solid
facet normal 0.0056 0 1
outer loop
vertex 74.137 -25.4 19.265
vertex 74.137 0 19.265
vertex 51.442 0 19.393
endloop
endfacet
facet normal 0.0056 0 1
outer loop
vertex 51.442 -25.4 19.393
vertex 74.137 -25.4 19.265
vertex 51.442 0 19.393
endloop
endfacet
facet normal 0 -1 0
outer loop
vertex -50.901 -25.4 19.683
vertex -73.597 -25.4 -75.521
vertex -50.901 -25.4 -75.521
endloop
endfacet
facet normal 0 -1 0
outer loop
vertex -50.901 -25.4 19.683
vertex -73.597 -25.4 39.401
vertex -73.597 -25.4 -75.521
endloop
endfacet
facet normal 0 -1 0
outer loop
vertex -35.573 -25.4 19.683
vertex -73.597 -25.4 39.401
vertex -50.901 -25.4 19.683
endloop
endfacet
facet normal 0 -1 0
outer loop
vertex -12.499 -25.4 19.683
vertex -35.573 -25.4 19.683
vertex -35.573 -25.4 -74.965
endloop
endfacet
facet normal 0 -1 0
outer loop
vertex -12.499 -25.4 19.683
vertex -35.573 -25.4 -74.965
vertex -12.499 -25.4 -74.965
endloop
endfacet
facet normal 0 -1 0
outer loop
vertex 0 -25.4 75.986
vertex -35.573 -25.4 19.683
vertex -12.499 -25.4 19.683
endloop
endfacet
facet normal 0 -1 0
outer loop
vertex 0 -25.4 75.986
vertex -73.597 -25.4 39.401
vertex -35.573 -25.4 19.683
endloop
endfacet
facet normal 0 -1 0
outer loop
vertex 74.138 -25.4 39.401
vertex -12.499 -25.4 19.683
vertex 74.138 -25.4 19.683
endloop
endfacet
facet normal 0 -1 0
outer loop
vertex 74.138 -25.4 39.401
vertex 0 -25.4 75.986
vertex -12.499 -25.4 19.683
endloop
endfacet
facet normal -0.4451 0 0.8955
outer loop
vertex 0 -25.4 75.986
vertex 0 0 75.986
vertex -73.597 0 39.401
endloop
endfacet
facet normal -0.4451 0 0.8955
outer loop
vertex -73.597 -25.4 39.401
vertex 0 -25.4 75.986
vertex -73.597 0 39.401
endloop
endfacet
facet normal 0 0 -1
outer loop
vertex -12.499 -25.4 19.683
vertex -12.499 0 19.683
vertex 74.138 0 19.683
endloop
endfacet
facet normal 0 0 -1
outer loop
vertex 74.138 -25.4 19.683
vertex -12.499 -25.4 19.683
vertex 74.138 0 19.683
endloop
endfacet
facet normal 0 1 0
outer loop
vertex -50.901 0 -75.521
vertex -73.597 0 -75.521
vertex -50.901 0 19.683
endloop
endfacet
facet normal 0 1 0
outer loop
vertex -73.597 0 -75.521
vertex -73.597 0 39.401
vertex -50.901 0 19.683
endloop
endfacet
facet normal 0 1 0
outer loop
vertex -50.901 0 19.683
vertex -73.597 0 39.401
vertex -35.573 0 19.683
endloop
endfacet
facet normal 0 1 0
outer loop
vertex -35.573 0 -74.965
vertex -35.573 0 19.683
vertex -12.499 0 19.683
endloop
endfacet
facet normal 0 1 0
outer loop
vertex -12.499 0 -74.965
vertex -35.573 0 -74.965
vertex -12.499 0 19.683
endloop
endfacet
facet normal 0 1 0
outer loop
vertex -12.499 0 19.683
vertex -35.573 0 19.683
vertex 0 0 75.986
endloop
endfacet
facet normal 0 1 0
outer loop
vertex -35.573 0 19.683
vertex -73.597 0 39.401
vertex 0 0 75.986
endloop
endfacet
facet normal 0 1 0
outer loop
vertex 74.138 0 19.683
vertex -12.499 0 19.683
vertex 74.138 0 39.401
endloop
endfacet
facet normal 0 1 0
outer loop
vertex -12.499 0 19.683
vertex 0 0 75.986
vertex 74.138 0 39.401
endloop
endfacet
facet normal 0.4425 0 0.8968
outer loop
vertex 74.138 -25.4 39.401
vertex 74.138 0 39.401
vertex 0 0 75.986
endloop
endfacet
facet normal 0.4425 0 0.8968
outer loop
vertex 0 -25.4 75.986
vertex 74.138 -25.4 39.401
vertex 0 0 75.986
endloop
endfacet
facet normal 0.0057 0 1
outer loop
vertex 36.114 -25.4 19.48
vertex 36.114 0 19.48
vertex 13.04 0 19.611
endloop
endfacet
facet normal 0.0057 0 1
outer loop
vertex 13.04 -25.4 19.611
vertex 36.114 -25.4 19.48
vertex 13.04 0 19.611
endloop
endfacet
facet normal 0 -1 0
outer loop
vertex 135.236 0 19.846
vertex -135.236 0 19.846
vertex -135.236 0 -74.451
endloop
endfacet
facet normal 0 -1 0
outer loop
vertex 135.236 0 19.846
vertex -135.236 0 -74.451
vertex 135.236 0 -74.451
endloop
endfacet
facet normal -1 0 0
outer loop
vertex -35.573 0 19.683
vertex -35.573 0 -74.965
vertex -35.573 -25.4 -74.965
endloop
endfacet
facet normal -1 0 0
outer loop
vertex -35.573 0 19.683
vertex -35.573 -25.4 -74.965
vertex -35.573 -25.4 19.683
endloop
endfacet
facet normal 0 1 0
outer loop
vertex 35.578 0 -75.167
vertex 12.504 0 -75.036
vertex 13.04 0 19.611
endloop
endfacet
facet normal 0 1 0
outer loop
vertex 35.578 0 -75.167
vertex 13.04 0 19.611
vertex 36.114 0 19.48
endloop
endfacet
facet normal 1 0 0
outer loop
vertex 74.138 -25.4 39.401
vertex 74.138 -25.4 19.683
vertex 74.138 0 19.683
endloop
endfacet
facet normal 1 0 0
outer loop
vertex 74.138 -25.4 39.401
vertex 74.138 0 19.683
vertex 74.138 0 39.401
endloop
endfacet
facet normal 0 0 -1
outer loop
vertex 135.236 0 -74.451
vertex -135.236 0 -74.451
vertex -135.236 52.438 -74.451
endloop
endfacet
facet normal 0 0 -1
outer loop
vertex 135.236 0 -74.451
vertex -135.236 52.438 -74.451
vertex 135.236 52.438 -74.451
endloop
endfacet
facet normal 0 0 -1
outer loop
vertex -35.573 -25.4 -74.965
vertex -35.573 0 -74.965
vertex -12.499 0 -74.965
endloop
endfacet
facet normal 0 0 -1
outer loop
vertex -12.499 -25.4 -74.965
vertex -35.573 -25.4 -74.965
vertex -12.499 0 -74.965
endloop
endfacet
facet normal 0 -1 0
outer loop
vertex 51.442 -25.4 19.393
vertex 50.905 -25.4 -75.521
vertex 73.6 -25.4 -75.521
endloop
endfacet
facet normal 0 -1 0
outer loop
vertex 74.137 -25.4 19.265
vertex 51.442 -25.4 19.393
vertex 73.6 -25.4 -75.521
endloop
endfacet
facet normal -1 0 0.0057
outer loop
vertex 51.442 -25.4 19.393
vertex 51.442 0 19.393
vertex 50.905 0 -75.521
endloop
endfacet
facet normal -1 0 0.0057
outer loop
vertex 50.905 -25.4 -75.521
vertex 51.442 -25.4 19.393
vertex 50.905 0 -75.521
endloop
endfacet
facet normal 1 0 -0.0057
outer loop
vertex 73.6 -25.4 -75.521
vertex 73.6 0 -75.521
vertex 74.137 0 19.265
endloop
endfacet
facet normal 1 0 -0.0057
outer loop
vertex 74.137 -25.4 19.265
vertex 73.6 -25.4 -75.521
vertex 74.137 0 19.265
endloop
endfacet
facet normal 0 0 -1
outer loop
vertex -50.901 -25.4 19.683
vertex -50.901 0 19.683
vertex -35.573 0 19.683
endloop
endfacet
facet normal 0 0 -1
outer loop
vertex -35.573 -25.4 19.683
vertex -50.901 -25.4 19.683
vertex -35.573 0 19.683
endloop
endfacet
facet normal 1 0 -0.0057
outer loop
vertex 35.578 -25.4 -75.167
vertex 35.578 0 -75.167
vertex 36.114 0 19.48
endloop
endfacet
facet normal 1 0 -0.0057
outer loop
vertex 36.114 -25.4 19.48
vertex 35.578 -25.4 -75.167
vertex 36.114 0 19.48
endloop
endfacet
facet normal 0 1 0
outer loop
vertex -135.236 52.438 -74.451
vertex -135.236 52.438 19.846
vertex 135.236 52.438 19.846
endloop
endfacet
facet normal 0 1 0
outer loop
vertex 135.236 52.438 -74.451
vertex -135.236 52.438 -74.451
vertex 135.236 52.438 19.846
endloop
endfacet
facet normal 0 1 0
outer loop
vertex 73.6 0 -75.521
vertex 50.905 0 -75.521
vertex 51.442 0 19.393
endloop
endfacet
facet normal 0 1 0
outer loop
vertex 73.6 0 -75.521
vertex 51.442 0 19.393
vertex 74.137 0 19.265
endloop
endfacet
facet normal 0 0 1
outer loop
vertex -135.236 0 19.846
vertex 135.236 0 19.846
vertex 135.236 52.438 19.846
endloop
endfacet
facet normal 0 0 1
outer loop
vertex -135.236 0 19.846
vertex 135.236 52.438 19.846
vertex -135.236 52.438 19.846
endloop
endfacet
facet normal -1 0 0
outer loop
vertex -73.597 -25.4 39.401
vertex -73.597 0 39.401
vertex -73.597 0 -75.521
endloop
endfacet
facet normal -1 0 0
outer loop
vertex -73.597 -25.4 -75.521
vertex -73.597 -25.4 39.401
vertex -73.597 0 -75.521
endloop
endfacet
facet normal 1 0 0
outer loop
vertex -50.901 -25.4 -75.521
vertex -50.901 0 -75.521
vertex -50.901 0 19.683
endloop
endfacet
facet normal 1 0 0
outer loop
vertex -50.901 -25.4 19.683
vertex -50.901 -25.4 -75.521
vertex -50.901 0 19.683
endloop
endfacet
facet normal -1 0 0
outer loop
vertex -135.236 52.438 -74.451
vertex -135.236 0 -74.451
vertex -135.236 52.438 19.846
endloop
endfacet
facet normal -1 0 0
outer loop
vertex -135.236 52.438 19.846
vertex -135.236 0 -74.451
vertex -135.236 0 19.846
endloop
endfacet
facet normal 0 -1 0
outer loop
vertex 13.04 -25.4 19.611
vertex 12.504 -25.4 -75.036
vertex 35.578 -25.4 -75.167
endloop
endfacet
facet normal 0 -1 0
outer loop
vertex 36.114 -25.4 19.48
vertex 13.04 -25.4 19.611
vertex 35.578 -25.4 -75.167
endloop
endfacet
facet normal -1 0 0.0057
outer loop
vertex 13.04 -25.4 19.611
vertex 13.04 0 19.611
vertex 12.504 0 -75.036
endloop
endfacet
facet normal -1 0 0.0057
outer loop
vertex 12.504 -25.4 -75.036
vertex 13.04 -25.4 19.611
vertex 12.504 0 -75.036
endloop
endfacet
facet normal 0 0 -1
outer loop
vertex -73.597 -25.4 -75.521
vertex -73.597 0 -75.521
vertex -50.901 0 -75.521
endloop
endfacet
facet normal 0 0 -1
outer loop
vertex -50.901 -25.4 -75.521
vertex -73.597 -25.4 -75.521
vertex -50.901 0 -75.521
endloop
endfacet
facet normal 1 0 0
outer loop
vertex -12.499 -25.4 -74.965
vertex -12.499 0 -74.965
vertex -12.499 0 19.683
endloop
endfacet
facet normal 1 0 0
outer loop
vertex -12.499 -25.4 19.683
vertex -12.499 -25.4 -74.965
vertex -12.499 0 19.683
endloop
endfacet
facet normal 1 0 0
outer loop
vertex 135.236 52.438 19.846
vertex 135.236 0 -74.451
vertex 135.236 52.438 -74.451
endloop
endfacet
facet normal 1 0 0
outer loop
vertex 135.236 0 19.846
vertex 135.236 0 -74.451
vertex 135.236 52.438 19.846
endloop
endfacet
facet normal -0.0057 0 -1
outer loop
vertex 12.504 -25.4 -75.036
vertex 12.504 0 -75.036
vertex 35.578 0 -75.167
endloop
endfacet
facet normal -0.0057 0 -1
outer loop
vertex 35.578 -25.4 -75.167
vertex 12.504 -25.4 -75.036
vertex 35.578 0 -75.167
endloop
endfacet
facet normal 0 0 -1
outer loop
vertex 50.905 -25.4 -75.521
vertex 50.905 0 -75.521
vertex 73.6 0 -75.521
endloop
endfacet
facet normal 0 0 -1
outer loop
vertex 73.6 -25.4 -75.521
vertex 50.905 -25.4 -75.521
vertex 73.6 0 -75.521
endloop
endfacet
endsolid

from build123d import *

# Parameters (mm, degrees)
F0_W     = 22.6951092482
F0_H     = 95.2044054866
F0_W_2   = 23.0742692947
F0_H_2   = 94.6485325694
F1_DEPTH = 25.4
F2_W     = 135.2362185717
F2_H     = 94.296477735
F3_DEPTH = 52.4381194264


with BuildPart() as f1:
    # F0 (on Front) → F1 (new body)
    with BuildSketch(Plane.XZ):
        with Locations((-62.2489973903, -27.9190726578)):
            Rectangle(F0_W, F0_H)
        with Locations((-24.0356624126, -27.6411361992)):
            Rectangle(F0_W_2, F0_H_2)
        Polygon((-73.5965520144, 39.4006446004), (-73.5965520144, 19.6831300855), (-50.9014427662, 19.6831300855), (-35.57279706, 19.6831300855), (-12.4985277653, 19.6831300855), (0.2708360553, 19.6831300855), (74.1382241249, 19.6831300855), (74.1382241249, 39.4006446004), align=None)
        Polygon((0, 75.9860053658), (-73.5965520144, 39.4006446004), (74.1382241249, 39.4006446004), align=None)
    extrude(amount=F1_DEPTH)


with BuildPart() as f1b:
    # F0 (on Front) → F1, piece 2 (new body)
    with BuildSketch(Plane.XZ):
        Polygon((36.113894749, 19.4802055093), (13.039995237, 19.6108378116), (12.5041535355, -75.0361779428), (35.5780530475, -75.1668102451), align=None)
    extrude(amount=F1_DEPTH)


with BuildPart() as f1c:
    # F0 (on Front) → F1, piece 3 (new body)
    with BuildSketch(Plane.XZ):
        Polygon((51.4422948019, 19.3934241575), (50.9049376152, -75.5212754011), (73.6004105757, -75.5212754011), (74.1370403436, 19.2649384259), align=None)
    extrude(amount=F1_DEPTH)


with BuildPart() as f3:
    # F2 (on Front) → F3 (new body)
    with BuildSketch(Plane.XZ):
        with Locations((67.6181092858, -27.3026116192)):
            Rectangle(F2_W, F2_H)
        with Locations((-67.6181092858, -27.3026116192)):
            Rectangle(F2_W, F2_H)
    extrude(amount=-F3_DEPTH)


solid = Compound([f1.part, f1b.part, f1c.part, f3.part])
